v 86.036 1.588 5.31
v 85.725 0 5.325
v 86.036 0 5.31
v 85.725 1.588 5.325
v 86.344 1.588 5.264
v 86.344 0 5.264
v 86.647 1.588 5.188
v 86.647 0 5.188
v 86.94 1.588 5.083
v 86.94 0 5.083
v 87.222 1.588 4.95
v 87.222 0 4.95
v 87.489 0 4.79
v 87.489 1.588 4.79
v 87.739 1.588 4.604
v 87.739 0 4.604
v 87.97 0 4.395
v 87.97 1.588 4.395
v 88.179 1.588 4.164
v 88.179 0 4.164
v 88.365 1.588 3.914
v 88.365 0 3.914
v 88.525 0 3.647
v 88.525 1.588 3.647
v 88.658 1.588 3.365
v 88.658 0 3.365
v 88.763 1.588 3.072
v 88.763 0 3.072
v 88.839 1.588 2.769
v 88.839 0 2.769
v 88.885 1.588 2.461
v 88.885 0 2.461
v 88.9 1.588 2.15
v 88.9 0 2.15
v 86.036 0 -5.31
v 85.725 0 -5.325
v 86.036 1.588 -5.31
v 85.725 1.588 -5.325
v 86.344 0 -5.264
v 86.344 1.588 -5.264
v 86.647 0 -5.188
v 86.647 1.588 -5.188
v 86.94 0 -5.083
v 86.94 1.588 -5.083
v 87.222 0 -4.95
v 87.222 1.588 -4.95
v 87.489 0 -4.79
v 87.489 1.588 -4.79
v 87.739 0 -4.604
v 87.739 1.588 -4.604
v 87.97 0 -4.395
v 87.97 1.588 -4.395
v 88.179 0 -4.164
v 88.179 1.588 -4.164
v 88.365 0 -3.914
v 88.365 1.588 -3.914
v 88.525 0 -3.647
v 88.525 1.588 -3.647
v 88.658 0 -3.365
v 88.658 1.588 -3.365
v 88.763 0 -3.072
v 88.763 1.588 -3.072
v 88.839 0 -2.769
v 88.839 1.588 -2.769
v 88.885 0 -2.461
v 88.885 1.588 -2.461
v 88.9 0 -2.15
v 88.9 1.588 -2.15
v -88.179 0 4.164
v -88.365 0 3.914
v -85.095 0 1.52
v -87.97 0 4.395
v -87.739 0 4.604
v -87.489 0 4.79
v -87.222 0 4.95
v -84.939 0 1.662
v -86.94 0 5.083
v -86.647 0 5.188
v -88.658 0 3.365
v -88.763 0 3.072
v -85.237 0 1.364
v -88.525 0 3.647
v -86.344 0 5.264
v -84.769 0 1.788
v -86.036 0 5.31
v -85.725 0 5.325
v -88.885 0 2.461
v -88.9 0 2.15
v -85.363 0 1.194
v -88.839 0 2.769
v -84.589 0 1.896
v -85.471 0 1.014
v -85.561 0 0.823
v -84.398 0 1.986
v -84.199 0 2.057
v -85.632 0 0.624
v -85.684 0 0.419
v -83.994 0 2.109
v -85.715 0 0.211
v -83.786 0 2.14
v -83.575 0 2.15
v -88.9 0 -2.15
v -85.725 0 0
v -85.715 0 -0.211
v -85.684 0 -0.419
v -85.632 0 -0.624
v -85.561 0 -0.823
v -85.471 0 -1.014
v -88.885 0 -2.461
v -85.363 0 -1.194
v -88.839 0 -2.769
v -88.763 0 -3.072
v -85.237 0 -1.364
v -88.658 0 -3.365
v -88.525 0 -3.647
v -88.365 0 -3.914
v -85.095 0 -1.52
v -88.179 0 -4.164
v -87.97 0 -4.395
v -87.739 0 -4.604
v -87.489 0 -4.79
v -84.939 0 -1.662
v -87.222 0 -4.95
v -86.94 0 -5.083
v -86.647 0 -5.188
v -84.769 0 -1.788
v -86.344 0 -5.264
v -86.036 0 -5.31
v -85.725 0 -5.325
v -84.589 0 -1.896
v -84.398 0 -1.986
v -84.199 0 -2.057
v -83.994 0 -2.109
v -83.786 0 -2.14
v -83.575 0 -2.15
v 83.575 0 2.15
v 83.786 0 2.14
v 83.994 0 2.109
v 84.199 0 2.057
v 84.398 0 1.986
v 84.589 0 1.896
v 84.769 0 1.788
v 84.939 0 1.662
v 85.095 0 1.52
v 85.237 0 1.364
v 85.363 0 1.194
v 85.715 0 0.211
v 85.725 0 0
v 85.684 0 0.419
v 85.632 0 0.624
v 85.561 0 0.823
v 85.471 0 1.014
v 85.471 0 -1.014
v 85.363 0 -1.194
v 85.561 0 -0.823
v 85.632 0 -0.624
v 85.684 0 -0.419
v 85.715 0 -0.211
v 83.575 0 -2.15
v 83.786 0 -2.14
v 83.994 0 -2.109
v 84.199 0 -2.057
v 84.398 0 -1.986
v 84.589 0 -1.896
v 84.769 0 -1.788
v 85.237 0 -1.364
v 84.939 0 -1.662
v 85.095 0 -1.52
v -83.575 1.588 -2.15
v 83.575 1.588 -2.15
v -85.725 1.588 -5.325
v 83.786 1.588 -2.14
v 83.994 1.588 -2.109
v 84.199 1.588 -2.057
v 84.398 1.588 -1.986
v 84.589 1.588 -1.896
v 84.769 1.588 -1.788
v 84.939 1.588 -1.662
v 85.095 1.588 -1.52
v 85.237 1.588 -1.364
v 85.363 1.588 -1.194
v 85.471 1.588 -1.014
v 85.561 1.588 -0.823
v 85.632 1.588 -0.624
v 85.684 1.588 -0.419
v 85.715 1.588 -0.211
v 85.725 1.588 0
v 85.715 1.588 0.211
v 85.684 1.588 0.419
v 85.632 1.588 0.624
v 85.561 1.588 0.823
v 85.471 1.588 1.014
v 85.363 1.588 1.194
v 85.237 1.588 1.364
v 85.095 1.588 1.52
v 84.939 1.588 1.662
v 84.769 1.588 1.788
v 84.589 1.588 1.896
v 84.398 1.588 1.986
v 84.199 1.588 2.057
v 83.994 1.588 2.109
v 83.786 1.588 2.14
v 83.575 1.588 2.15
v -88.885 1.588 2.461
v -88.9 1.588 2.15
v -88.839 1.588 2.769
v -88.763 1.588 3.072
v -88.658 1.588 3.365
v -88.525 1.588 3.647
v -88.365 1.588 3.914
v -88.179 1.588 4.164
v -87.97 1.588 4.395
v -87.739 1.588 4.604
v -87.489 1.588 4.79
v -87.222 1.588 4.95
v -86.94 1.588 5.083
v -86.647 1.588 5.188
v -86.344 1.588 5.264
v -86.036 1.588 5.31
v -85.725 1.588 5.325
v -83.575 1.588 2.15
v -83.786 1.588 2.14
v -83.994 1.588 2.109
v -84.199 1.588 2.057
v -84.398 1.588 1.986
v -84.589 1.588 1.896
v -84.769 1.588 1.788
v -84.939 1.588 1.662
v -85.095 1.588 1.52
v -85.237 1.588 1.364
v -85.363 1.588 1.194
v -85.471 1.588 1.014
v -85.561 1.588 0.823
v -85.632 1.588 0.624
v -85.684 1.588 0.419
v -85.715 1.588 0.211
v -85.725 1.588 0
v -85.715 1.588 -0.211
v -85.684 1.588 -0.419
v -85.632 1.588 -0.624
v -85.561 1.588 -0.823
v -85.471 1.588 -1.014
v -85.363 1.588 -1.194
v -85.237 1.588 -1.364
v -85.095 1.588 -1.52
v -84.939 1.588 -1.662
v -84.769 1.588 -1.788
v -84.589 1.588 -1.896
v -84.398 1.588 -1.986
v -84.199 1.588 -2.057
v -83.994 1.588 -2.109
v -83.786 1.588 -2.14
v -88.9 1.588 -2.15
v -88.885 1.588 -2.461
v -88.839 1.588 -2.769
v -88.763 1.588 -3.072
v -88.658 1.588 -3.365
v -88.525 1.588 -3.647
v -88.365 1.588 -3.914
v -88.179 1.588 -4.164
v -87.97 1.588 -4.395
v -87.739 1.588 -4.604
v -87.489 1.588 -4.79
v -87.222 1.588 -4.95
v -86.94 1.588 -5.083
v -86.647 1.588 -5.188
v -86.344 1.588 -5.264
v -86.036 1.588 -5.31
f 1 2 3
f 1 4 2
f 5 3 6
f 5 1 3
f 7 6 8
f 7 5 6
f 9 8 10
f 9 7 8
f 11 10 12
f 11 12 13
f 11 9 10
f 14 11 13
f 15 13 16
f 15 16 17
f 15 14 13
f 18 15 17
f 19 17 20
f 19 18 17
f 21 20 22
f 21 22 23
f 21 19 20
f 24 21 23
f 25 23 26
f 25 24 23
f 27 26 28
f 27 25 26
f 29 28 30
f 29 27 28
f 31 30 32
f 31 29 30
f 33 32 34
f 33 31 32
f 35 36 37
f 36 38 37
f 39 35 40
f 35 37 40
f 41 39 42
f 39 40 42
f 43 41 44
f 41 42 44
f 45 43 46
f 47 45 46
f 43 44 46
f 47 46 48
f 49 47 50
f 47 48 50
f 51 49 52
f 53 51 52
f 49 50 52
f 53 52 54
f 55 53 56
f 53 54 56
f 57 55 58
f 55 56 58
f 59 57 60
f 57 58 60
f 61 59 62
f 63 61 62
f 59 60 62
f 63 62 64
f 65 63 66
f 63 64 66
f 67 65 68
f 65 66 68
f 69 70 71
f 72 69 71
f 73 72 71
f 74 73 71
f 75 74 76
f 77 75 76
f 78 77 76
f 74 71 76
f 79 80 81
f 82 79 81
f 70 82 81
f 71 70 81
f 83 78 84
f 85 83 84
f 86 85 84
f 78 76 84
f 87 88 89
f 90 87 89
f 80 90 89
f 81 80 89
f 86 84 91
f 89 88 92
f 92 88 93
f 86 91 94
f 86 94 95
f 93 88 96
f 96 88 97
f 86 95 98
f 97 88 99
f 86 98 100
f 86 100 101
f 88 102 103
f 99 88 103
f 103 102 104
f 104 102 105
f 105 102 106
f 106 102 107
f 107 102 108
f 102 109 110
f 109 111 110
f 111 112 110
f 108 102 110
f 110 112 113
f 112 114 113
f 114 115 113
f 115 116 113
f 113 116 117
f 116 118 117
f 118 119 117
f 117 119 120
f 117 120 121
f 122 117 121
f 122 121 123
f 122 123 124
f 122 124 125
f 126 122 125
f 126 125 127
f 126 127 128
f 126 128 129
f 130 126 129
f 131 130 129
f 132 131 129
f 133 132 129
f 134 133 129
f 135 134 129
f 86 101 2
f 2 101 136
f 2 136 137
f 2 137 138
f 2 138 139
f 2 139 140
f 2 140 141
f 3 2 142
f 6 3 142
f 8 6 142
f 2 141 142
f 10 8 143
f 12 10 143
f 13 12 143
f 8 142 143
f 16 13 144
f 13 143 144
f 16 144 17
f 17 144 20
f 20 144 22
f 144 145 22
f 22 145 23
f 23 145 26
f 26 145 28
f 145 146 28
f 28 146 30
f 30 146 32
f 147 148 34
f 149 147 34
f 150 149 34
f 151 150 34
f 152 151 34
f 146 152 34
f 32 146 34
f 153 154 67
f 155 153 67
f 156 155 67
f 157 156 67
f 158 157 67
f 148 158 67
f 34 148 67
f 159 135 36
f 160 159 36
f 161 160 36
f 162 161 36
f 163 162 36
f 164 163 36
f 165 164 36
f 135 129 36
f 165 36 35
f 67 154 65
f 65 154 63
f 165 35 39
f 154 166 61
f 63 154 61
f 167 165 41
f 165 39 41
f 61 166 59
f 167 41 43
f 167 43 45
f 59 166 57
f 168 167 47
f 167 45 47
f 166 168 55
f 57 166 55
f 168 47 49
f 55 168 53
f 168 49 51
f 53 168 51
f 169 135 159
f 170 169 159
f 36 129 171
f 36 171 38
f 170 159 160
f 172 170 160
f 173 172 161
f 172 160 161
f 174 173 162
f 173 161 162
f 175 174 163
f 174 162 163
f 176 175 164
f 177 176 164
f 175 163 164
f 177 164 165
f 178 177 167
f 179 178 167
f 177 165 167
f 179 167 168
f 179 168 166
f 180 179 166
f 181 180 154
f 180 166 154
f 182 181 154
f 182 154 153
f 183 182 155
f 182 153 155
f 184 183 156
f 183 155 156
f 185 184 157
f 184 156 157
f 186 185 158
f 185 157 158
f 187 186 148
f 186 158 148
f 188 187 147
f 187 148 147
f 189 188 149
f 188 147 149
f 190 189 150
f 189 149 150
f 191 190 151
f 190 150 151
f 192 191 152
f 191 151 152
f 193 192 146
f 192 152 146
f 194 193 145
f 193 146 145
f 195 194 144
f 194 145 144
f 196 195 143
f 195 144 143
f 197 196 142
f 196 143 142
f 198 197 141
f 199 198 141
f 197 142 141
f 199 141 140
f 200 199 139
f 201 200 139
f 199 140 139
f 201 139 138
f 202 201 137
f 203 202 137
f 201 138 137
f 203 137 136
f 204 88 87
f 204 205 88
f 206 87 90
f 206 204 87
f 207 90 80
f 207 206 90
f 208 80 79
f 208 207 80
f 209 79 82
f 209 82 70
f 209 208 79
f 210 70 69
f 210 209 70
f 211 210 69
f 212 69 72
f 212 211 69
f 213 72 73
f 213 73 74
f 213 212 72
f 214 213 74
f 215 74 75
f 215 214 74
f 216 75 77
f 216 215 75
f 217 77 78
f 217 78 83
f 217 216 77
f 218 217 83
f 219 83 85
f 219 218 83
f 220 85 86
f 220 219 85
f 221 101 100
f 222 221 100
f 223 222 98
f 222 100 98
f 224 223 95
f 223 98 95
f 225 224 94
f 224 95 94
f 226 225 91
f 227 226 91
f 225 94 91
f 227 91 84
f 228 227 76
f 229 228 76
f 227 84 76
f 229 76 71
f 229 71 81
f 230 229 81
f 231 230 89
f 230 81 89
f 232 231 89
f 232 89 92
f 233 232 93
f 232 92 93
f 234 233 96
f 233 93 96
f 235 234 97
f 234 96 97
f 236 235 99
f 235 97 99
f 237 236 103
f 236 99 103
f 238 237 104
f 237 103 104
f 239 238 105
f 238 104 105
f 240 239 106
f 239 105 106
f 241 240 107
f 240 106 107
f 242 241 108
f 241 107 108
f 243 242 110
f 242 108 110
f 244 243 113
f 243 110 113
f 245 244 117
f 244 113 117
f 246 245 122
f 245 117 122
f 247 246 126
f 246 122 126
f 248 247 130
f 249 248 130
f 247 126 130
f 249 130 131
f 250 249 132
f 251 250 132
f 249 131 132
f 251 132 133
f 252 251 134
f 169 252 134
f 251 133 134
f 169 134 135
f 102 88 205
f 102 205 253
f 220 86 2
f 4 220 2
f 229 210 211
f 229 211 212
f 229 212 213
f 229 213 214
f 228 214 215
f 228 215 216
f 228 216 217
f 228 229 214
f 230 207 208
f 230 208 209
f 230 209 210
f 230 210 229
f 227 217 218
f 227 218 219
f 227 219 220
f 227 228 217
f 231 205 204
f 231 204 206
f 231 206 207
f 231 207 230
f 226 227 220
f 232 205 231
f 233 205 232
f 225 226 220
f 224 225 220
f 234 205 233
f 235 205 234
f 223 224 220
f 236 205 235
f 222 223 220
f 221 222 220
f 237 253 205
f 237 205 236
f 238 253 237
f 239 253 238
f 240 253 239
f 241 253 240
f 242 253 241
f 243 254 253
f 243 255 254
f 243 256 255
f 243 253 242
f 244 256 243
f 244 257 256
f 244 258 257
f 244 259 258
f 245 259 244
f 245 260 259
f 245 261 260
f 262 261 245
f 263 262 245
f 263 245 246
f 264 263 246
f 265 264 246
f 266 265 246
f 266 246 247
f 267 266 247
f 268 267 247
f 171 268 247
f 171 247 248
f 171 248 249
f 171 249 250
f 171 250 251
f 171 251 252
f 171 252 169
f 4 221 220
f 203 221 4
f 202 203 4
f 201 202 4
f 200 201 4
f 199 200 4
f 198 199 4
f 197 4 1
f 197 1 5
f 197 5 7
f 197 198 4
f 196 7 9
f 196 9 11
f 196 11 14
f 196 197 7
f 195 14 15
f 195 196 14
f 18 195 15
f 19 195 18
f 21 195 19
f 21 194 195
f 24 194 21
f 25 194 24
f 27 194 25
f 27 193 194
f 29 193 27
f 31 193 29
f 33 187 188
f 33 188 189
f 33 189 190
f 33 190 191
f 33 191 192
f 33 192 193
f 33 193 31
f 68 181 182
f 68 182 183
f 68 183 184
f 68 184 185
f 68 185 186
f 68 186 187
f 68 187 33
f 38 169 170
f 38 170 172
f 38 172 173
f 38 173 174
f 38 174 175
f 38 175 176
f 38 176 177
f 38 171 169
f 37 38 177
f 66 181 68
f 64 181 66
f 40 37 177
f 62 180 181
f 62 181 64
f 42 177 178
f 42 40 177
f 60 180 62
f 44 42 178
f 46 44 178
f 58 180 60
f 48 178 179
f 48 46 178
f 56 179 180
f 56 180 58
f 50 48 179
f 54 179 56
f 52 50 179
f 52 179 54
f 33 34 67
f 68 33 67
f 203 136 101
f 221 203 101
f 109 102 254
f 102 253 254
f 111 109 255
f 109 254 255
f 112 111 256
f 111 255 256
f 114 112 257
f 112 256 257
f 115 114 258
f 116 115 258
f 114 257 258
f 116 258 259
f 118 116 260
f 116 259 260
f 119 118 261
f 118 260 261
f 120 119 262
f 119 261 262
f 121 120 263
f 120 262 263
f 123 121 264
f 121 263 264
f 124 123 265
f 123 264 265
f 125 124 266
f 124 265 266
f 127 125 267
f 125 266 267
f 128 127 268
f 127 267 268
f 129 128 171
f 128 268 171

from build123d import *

# Parameters (mm, degrees)
SKETCH1_W           = 177.8
SKETCH1_H           = 10.65
BOSS_EXTRUDE1_DEPTH = 1.5875
FILLET1_R           = 3.175


with BuildPart() as part:
    # Sketch1 → Boss-Extrude1 (new body)
    with BuildSketch(Plane(origin=(0, 0, 0), x_dir=(1, 0, 0), z_dir=(0, 1, 0))):
        Rectangle(SKETCH1_W, SKETCH1_H)
        with BuildLine():
            Line((-83.575, 2.15), (83.575, 2.15))
            ThreePointArc((83.575, 2.15), (85.725, 0), (83.575, -2.15))
            Line((83.575, -2.15), (-83.575, -2.15))
            ThreePointArc((-83.575, -2.15), (-85.725, 0), (-83.575, 2.15))
        make_face(mode=Mode.SUBTRACT)
    extrude(amount=BOSS_EXTRUDE1_DEPTH)

    # Fillet1
    fillet1_edges = [part.edges().sort_by_distance(p)[0] for p in [
        (88.9, 0.79375, 5.325),
        (-88.9, 0.79375, 5.325),
        (-88.9, 0.79375, -5.325),
        (88.9, 0.79375, -5.325),
    ]]
    fillet(fillet1_edges, radius=FILLET1_R)


solid = part.part
